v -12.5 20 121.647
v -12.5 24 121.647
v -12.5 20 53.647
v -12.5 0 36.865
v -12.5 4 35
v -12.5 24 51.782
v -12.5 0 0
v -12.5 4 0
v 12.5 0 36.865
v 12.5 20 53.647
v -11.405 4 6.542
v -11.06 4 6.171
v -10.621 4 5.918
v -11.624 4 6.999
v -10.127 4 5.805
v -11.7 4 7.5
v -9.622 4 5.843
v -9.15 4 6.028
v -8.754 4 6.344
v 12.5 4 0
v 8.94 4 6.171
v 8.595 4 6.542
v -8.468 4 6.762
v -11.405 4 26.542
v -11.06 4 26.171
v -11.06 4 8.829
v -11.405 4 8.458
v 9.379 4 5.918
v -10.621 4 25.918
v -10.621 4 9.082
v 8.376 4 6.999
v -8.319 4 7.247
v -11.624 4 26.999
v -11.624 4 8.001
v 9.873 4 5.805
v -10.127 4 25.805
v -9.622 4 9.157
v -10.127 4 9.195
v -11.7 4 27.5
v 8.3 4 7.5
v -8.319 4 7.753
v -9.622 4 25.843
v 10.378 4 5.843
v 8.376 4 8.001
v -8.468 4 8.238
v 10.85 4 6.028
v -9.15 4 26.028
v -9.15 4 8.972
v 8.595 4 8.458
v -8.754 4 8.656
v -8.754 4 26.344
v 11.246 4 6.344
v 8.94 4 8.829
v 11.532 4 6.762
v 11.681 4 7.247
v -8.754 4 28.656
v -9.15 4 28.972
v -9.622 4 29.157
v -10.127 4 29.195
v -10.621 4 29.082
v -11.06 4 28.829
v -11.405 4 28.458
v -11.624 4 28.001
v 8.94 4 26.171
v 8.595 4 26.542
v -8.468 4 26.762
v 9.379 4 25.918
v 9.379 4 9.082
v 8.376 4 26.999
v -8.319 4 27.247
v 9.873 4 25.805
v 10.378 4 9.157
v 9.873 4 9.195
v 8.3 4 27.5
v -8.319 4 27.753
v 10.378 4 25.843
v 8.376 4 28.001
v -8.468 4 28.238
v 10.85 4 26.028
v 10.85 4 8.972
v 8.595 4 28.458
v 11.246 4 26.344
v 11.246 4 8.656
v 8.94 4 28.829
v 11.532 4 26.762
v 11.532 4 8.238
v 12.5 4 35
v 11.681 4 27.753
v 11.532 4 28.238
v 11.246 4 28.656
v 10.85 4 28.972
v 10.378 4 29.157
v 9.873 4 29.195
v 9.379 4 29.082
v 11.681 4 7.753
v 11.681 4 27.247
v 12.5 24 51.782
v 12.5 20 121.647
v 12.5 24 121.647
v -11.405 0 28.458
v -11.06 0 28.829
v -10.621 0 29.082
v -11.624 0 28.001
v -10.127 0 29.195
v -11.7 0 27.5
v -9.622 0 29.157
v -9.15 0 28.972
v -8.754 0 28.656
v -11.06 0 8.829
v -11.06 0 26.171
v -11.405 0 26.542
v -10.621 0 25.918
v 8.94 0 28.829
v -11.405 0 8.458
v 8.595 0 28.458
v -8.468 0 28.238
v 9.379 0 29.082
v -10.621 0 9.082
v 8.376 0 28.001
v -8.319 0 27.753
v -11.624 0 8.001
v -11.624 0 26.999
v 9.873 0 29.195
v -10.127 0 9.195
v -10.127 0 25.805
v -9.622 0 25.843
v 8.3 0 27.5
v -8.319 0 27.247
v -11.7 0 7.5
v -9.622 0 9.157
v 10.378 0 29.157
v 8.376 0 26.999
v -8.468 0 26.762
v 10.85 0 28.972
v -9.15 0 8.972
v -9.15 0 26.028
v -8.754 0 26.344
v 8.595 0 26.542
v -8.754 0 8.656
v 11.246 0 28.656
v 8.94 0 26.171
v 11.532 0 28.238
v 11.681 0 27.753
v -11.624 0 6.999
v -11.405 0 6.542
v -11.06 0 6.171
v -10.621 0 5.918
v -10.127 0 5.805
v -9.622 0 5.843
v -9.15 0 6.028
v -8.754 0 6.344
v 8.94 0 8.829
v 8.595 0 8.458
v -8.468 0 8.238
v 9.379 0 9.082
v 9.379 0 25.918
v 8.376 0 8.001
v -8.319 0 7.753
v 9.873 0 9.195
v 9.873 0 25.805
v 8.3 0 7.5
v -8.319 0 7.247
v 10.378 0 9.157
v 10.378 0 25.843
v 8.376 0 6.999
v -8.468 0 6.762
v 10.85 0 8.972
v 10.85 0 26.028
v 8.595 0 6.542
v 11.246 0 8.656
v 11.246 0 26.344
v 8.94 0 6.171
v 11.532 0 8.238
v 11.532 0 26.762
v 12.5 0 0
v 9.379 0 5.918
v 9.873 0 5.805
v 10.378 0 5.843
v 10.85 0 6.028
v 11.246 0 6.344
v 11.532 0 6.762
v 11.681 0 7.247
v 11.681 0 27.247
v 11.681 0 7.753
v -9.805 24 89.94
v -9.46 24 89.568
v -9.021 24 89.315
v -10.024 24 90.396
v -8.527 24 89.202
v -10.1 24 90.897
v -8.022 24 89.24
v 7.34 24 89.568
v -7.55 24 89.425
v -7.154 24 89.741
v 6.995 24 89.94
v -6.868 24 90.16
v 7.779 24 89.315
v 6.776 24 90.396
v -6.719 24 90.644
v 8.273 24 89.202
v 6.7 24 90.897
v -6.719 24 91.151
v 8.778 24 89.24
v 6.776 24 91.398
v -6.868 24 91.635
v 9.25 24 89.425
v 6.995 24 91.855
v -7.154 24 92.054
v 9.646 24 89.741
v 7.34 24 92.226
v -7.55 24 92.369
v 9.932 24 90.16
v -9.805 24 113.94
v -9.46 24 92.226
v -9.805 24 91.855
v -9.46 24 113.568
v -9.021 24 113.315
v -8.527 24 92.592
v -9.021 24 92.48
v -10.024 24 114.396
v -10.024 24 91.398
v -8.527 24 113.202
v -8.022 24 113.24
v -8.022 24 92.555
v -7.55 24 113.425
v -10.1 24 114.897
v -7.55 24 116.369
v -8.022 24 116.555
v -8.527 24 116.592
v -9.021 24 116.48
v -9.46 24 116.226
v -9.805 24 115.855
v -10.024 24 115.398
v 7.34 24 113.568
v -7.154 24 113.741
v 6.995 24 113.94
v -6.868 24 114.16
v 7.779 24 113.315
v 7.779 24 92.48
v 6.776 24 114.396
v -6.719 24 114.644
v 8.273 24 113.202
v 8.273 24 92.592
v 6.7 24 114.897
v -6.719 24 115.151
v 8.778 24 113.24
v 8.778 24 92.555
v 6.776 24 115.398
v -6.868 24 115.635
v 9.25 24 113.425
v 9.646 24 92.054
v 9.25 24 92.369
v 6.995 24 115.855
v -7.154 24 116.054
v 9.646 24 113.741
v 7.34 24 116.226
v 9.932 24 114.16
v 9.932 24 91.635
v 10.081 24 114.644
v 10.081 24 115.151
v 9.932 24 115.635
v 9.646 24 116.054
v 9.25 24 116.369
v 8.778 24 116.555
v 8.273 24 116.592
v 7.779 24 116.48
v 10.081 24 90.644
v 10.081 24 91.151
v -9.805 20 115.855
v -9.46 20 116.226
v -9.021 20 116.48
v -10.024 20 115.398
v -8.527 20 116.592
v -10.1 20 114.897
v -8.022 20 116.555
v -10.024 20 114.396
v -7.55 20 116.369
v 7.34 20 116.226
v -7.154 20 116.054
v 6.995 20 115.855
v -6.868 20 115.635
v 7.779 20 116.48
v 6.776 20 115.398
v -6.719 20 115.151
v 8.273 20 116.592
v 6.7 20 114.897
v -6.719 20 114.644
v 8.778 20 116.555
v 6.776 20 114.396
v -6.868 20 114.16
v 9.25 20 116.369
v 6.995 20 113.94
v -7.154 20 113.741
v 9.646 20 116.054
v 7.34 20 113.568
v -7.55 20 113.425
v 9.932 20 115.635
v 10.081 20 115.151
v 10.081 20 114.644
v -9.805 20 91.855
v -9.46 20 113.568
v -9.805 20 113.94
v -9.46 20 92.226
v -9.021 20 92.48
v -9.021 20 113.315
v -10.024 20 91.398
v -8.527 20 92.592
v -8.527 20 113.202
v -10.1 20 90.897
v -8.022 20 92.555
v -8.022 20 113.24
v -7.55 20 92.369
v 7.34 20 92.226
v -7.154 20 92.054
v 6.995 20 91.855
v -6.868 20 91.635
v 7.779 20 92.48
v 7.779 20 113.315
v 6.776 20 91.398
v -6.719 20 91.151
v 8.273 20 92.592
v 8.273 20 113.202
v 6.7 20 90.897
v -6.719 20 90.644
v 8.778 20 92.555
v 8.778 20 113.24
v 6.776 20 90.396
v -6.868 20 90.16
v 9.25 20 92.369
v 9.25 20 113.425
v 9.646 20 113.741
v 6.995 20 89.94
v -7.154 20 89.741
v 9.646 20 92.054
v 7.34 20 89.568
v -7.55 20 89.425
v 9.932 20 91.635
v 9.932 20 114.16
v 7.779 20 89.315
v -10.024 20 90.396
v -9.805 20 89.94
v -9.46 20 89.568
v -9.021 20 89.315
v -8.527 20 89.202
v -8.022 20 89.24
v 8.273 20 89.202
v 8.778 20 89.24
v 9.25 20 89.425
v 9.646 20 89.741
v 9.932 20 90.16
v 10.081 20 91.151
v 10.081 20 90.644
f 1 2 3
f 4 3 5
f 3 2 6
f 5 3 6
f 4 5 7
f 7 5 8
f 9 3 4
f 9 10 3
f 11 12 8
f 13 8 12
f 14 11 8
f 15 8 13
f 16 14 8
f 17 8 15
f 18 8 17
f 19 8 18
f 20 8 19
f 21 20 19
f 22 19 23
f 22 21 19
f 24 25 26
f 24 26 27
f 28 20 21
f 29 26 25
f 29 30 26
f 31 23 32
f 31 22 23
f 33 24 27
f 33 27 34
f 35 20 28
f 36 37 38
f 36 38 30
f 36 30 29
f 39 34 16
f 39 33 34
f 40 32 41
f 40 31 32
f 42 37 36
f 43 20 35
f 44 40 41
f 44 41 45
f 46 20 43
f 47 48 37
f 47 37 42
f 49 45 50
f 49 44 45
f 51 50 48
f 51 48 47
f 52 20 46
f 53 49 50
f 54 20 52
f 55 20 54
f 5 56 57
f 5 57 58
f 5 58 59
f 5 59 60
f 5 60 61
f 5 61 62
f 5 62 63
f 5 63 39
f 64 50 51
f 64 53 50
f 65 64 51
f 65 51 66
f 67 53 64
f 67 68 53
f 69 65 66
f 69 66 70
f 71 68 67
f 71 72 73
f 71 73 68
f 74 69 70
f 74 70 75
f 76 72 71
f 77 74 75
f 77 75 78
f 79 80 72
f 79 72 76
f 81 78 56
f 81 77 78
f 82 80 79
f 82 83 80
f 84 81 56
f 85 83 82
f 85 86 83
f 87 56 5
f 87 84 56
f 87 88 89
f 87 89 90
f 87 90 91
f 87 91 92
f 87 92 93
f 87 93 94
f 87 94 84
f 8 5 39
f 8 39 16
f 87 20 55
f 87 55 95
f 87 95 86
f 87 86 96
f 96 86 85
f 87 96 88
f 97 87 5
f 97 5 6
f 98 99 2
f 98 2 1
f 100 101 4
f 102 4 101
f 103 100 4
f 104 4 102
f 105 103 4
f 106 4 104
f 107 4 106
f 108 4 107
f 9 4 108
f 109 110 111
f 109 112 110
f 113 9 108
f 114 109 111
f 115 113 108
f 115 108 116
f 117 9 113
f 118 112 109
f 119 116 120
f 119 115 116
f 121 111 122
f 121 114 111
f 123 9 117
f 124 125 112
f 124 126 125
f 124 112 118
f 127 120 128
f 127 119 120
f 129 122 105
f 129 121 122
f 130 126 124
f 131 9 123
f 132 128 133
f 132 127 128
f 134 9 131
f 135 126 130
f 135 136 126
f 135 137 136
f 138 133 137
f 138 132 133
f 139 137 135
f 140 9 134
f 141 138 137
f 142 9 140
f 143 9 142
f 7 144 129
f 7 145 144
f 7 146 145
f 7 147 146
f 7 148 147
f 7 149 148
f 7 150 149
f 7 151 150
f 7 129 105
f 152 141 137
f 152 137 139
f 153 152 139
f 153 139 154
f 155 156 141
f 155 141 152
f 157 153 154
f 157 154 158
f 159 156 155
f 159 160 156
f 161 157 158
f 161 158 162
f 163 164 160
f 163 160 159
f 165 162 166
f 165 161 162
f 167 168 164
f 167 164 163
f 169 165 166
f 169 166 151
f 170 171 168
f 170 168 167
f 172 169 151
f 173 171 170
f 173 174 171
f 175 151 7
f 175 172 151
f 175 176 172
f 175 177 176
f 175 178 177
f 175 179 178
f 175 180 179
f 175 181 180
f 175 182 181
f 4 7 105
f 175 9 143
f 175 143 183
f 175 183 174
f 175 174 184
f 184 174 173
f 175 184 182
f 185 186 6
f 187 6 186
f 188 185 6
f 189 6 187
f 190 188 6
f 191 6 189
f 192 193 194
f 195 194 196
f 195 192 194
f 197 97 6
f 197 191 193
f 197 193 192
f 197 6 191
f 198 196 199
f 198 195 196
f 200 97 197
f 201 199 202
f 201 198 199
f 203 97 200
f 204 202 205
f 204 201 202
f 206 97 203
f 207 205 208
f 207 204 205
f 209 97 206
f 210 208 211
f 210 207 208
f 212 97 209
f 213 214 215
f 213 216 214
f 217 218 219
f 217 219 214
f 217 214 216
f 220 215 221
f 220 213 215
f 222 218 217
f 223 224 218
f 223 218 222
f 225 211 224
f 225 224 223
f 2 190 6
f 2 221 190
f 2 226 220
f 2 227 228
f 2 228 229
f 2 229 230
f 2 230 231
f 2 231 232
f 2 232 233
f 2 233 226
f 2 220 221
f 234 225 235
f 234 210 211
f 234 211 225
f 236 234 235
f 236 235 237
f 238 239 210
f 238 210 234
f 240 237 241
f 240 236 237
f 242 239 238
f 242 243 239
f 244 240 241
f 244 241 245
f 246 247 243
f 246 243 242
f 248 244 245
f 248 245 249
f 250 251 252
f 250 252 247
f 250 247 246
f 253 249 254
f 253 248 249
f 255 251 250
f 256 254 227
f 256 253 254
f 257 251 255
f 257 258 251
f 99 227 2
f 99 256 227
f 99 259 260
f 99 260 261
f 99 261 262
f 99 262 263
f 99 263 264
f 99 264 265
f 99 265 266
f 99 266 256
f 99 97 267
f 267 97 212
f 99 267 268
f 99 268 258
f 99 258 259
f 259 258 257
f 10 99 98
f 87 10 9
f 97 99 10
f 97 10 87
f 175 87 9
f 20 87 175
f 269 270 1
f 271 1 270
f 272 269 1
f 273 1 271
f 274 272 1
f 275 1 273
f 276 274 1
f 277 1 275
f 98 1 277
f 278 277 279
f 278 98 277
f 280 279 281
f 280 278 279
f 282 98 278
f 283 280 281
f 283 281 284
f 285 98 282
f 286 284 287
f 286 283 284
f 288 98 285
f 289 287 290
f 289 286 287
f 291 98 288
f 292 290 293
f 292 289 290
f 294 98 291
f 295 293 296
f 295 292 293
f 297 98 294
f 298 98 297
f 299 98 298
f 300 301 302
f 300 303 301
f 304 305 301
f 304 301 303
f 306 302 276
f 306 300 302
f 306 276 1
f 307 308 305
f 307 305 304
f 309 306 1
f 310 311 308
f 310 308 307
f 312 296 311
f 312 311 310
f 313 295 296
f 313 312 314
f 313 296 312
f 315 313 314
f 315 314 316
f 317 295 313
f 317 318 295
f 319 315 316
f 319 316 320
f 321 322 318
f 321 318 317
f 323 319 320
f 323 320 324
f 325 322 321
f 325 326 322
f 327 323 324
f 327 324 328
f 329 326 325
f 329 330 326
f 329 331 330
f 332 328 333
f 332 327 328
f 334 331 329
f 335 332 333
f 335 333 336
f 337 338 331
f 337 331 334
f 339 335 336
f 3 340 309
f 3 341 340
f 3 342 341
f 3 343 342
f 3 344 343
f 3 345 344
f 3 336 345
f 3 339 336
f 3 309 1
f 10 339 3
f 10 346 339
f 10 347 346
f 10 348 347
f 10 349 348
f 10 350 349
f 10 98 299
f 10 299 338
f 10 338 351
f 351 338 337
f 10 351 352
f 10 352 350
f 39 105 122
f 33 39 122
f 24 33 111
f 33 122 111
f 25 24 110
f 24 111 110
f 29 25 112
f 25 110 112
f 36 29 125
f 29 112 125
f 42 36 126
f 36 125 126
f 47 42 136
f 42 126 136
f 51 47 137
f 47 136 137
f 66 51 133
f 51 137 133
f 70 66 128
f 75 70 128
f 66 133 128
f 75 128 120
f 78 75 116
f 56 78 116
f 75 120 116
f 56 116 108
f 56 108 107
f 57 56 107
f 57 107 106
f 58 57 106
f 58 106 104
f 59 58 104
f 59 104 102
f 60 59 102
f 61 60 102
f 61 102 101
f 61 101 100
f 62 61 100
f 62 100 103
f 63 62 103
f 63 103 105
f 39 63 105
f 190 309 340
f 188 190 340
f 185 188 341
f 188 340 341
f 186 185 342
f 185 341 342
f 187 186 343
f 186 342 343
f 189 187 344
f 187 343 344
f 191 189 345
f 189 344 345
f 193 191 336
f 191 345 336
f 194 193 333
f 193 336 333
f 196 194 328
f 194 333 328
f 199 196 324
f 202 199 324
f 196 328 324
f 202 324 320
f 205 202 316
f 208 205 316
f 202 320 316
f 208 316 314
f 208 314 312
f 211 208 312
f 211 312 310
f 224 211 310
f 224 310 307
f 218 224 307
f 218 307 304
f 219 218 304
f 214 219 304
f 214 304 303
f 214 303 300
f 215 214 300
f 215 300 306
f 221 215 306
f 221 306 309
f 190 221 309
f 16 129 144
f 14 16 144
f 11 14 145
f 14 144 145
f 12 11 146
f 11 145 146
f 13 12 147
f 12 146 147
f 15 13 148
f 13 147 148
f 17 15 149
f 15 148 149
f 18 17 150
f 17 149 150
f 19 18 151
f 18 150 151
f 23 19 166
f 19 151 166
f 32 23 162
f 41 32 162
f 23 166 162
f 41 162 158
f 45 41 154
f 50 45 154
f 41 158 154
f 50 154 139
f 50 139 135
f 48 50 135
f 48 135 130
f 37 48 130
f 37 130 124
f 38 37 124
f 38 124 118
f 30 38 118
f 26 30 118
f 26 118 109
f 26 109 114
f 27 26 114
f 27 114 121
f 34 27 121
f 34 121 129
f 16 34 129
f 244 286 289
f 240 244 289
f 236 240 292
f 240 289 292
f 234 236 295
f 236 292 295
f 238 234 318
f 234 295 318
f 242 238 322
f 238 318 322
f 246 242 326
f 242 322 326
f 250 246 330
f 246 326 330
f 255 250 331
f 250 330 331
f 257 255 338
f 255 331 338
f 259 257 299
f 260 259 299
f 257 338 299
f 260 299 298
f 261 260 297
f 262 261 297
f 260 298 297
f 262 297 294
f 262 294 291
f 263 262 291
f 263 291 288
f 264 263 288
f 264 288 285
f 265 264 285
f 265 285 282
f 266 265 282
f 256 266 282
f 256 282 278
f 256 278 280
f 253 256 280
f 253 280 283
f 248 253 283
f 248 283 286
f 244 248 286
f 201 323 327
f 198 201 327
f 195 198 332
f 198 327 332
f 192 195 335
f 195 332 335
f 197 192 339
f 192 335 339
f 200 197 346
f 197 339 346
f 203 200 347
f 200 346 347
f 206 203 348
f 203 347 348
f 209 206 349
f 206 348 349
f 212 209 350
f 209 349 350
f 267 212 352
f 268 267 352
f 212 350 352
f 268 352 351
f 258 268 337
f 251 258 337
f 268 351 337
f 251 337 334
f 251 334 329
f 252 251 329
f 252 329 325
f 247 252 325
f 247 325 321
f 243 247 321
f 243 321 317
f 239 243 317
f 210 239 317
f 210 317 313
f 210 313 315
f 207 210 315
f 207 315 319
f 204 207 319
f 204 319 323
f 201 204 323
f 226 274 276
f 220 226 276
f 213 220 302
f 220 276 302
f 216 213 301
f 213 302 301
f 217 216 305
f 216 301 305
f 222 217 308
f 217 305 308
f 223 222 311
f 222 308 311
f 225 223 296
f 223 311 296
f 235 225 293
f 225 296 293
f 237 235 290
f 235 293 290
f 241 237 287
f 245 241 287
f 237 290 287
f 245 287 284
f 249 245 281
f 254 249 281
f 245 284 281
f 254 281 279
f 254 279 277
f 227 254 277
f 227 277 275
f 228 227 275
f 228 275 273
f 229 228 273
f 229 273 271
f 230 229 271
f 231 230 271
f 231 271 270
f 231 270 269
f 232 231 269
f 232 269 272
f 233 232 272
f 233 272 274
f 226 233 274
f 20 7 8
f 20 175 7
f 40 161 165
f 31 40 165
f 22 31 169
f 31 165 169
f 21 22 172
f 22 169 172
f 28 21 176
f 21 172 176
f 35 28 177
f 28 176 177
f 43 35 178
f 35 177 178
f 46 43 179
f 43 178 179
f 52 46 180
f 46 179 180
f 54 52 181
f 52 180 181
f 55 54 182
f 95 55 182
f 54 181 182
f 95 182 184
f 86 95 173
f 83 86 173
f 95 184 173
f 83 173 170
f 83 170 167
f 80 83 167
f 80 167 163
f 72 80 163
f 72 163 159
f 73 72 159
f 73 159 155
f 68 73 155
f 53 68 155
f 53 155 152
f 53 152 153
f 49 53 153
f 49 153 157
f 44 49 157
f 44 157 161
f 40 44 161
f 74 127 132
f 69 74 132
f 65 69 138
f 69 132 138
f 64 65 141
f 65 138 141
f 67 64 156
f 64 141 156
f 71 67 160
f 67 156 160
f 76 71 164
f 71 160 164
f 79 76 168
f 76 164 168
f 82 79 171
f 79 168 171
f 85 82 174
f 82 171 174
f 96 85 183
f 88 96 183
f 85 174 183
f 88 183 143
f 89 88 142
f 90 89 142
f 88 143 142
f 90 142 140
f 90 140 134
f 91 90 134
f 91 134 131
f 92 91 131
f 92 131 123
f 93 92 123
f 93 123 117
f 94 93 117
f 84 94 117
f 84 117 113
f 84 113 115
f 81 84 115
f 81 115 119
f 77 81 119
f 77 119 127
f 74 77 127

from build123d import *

# Parameters (mm, degrees)
BOSS_EXTRUDE1_DEPTH      = 12.5
M3_CLEARANCE_HOLE1_D     = 3.4
M3_CLEARANCE_HOLE1_DEPTH = 8.5
M3_CLEARANCE_HOLE1_TIP   = 1.021463052
M3_CLEARANCE_HOLE2_D     = 3.4
M3_CLEARANCE_HOLE2_DEPTH = 8.5
M3_CLEARANCE_HOLE2_TIP   = 1.021463052


with BuildPart() as part:
    # Sketch2 → Boss-Extrude1 (new body, symmetric)
    with BuildSketch(Plane(origin=(0, 0, 0), x_dir=(0, 0, -1), z_dir=(1, 0, 0))):
        Polygon((0, 0), (0, 4), (-35, 4), (-51.781992624, 24), (-121.647223256, 24), (-121.647223256, 20), (-53.647223256, 20), (-36.865230633, 0), align=None)
    extrude(amount=BOSS_EXTRUDE1_DEPTH, both=True)

    # M3 Clearance Hole1
    with Locations(Plane(origin=(0, 24, 0), x_dir=(1, 0, 0), z_dir=(0, 1, 0))):
        with Locations((-8.4, -90.897223256), (-8.4, -114.897223256), (8.4, -114.897223256), (8.4, -90.897223256)):
            Hole(M3_CLEARANCE_HOLE1_D / 2, depth=M3_CLEARANCE_HOLE1_DEPTH)
            with Locations((0, 0, -(M3_CLEARANCE_HOLE1_DEPTH + M3_CLEARANCE_HOLE1_TIP / 2))):  # 118° drill point
                Cone(0, M3_CLEARANCE_HOLE1_D / 2, M3_CLEARANCE_HOLE1_TIP, mode=Mode.SUBTRACT)

    # M3 Clearance Hole2
    with Locations(Plane(origin=(0, 4, 0), x_dir=(1, 0, 0), z_dir=(0, 1, 0))):
        with Locations((-10, -27.5), (10, -27.5), (10, -7.5), (-10, -7.5)):
            Hole(M3_CLEARANCE_HOLE2_D / 2, depth=M3_CLEARANCE_HOLE2_DEPTH)
            with Locations((0, 0, -(M3_CLEARANCE_HOLE2_DEPTH + M3_CLEARANCE_HOLE2_TIP / 2))):  # 118° drill point
                Cone(0, M3_CLEARANCE_HOLE2_D / 2, M3_CLEARANCE_HOLE2_TIP, mode=Mode.SUBTRACT)


solid = part.part
